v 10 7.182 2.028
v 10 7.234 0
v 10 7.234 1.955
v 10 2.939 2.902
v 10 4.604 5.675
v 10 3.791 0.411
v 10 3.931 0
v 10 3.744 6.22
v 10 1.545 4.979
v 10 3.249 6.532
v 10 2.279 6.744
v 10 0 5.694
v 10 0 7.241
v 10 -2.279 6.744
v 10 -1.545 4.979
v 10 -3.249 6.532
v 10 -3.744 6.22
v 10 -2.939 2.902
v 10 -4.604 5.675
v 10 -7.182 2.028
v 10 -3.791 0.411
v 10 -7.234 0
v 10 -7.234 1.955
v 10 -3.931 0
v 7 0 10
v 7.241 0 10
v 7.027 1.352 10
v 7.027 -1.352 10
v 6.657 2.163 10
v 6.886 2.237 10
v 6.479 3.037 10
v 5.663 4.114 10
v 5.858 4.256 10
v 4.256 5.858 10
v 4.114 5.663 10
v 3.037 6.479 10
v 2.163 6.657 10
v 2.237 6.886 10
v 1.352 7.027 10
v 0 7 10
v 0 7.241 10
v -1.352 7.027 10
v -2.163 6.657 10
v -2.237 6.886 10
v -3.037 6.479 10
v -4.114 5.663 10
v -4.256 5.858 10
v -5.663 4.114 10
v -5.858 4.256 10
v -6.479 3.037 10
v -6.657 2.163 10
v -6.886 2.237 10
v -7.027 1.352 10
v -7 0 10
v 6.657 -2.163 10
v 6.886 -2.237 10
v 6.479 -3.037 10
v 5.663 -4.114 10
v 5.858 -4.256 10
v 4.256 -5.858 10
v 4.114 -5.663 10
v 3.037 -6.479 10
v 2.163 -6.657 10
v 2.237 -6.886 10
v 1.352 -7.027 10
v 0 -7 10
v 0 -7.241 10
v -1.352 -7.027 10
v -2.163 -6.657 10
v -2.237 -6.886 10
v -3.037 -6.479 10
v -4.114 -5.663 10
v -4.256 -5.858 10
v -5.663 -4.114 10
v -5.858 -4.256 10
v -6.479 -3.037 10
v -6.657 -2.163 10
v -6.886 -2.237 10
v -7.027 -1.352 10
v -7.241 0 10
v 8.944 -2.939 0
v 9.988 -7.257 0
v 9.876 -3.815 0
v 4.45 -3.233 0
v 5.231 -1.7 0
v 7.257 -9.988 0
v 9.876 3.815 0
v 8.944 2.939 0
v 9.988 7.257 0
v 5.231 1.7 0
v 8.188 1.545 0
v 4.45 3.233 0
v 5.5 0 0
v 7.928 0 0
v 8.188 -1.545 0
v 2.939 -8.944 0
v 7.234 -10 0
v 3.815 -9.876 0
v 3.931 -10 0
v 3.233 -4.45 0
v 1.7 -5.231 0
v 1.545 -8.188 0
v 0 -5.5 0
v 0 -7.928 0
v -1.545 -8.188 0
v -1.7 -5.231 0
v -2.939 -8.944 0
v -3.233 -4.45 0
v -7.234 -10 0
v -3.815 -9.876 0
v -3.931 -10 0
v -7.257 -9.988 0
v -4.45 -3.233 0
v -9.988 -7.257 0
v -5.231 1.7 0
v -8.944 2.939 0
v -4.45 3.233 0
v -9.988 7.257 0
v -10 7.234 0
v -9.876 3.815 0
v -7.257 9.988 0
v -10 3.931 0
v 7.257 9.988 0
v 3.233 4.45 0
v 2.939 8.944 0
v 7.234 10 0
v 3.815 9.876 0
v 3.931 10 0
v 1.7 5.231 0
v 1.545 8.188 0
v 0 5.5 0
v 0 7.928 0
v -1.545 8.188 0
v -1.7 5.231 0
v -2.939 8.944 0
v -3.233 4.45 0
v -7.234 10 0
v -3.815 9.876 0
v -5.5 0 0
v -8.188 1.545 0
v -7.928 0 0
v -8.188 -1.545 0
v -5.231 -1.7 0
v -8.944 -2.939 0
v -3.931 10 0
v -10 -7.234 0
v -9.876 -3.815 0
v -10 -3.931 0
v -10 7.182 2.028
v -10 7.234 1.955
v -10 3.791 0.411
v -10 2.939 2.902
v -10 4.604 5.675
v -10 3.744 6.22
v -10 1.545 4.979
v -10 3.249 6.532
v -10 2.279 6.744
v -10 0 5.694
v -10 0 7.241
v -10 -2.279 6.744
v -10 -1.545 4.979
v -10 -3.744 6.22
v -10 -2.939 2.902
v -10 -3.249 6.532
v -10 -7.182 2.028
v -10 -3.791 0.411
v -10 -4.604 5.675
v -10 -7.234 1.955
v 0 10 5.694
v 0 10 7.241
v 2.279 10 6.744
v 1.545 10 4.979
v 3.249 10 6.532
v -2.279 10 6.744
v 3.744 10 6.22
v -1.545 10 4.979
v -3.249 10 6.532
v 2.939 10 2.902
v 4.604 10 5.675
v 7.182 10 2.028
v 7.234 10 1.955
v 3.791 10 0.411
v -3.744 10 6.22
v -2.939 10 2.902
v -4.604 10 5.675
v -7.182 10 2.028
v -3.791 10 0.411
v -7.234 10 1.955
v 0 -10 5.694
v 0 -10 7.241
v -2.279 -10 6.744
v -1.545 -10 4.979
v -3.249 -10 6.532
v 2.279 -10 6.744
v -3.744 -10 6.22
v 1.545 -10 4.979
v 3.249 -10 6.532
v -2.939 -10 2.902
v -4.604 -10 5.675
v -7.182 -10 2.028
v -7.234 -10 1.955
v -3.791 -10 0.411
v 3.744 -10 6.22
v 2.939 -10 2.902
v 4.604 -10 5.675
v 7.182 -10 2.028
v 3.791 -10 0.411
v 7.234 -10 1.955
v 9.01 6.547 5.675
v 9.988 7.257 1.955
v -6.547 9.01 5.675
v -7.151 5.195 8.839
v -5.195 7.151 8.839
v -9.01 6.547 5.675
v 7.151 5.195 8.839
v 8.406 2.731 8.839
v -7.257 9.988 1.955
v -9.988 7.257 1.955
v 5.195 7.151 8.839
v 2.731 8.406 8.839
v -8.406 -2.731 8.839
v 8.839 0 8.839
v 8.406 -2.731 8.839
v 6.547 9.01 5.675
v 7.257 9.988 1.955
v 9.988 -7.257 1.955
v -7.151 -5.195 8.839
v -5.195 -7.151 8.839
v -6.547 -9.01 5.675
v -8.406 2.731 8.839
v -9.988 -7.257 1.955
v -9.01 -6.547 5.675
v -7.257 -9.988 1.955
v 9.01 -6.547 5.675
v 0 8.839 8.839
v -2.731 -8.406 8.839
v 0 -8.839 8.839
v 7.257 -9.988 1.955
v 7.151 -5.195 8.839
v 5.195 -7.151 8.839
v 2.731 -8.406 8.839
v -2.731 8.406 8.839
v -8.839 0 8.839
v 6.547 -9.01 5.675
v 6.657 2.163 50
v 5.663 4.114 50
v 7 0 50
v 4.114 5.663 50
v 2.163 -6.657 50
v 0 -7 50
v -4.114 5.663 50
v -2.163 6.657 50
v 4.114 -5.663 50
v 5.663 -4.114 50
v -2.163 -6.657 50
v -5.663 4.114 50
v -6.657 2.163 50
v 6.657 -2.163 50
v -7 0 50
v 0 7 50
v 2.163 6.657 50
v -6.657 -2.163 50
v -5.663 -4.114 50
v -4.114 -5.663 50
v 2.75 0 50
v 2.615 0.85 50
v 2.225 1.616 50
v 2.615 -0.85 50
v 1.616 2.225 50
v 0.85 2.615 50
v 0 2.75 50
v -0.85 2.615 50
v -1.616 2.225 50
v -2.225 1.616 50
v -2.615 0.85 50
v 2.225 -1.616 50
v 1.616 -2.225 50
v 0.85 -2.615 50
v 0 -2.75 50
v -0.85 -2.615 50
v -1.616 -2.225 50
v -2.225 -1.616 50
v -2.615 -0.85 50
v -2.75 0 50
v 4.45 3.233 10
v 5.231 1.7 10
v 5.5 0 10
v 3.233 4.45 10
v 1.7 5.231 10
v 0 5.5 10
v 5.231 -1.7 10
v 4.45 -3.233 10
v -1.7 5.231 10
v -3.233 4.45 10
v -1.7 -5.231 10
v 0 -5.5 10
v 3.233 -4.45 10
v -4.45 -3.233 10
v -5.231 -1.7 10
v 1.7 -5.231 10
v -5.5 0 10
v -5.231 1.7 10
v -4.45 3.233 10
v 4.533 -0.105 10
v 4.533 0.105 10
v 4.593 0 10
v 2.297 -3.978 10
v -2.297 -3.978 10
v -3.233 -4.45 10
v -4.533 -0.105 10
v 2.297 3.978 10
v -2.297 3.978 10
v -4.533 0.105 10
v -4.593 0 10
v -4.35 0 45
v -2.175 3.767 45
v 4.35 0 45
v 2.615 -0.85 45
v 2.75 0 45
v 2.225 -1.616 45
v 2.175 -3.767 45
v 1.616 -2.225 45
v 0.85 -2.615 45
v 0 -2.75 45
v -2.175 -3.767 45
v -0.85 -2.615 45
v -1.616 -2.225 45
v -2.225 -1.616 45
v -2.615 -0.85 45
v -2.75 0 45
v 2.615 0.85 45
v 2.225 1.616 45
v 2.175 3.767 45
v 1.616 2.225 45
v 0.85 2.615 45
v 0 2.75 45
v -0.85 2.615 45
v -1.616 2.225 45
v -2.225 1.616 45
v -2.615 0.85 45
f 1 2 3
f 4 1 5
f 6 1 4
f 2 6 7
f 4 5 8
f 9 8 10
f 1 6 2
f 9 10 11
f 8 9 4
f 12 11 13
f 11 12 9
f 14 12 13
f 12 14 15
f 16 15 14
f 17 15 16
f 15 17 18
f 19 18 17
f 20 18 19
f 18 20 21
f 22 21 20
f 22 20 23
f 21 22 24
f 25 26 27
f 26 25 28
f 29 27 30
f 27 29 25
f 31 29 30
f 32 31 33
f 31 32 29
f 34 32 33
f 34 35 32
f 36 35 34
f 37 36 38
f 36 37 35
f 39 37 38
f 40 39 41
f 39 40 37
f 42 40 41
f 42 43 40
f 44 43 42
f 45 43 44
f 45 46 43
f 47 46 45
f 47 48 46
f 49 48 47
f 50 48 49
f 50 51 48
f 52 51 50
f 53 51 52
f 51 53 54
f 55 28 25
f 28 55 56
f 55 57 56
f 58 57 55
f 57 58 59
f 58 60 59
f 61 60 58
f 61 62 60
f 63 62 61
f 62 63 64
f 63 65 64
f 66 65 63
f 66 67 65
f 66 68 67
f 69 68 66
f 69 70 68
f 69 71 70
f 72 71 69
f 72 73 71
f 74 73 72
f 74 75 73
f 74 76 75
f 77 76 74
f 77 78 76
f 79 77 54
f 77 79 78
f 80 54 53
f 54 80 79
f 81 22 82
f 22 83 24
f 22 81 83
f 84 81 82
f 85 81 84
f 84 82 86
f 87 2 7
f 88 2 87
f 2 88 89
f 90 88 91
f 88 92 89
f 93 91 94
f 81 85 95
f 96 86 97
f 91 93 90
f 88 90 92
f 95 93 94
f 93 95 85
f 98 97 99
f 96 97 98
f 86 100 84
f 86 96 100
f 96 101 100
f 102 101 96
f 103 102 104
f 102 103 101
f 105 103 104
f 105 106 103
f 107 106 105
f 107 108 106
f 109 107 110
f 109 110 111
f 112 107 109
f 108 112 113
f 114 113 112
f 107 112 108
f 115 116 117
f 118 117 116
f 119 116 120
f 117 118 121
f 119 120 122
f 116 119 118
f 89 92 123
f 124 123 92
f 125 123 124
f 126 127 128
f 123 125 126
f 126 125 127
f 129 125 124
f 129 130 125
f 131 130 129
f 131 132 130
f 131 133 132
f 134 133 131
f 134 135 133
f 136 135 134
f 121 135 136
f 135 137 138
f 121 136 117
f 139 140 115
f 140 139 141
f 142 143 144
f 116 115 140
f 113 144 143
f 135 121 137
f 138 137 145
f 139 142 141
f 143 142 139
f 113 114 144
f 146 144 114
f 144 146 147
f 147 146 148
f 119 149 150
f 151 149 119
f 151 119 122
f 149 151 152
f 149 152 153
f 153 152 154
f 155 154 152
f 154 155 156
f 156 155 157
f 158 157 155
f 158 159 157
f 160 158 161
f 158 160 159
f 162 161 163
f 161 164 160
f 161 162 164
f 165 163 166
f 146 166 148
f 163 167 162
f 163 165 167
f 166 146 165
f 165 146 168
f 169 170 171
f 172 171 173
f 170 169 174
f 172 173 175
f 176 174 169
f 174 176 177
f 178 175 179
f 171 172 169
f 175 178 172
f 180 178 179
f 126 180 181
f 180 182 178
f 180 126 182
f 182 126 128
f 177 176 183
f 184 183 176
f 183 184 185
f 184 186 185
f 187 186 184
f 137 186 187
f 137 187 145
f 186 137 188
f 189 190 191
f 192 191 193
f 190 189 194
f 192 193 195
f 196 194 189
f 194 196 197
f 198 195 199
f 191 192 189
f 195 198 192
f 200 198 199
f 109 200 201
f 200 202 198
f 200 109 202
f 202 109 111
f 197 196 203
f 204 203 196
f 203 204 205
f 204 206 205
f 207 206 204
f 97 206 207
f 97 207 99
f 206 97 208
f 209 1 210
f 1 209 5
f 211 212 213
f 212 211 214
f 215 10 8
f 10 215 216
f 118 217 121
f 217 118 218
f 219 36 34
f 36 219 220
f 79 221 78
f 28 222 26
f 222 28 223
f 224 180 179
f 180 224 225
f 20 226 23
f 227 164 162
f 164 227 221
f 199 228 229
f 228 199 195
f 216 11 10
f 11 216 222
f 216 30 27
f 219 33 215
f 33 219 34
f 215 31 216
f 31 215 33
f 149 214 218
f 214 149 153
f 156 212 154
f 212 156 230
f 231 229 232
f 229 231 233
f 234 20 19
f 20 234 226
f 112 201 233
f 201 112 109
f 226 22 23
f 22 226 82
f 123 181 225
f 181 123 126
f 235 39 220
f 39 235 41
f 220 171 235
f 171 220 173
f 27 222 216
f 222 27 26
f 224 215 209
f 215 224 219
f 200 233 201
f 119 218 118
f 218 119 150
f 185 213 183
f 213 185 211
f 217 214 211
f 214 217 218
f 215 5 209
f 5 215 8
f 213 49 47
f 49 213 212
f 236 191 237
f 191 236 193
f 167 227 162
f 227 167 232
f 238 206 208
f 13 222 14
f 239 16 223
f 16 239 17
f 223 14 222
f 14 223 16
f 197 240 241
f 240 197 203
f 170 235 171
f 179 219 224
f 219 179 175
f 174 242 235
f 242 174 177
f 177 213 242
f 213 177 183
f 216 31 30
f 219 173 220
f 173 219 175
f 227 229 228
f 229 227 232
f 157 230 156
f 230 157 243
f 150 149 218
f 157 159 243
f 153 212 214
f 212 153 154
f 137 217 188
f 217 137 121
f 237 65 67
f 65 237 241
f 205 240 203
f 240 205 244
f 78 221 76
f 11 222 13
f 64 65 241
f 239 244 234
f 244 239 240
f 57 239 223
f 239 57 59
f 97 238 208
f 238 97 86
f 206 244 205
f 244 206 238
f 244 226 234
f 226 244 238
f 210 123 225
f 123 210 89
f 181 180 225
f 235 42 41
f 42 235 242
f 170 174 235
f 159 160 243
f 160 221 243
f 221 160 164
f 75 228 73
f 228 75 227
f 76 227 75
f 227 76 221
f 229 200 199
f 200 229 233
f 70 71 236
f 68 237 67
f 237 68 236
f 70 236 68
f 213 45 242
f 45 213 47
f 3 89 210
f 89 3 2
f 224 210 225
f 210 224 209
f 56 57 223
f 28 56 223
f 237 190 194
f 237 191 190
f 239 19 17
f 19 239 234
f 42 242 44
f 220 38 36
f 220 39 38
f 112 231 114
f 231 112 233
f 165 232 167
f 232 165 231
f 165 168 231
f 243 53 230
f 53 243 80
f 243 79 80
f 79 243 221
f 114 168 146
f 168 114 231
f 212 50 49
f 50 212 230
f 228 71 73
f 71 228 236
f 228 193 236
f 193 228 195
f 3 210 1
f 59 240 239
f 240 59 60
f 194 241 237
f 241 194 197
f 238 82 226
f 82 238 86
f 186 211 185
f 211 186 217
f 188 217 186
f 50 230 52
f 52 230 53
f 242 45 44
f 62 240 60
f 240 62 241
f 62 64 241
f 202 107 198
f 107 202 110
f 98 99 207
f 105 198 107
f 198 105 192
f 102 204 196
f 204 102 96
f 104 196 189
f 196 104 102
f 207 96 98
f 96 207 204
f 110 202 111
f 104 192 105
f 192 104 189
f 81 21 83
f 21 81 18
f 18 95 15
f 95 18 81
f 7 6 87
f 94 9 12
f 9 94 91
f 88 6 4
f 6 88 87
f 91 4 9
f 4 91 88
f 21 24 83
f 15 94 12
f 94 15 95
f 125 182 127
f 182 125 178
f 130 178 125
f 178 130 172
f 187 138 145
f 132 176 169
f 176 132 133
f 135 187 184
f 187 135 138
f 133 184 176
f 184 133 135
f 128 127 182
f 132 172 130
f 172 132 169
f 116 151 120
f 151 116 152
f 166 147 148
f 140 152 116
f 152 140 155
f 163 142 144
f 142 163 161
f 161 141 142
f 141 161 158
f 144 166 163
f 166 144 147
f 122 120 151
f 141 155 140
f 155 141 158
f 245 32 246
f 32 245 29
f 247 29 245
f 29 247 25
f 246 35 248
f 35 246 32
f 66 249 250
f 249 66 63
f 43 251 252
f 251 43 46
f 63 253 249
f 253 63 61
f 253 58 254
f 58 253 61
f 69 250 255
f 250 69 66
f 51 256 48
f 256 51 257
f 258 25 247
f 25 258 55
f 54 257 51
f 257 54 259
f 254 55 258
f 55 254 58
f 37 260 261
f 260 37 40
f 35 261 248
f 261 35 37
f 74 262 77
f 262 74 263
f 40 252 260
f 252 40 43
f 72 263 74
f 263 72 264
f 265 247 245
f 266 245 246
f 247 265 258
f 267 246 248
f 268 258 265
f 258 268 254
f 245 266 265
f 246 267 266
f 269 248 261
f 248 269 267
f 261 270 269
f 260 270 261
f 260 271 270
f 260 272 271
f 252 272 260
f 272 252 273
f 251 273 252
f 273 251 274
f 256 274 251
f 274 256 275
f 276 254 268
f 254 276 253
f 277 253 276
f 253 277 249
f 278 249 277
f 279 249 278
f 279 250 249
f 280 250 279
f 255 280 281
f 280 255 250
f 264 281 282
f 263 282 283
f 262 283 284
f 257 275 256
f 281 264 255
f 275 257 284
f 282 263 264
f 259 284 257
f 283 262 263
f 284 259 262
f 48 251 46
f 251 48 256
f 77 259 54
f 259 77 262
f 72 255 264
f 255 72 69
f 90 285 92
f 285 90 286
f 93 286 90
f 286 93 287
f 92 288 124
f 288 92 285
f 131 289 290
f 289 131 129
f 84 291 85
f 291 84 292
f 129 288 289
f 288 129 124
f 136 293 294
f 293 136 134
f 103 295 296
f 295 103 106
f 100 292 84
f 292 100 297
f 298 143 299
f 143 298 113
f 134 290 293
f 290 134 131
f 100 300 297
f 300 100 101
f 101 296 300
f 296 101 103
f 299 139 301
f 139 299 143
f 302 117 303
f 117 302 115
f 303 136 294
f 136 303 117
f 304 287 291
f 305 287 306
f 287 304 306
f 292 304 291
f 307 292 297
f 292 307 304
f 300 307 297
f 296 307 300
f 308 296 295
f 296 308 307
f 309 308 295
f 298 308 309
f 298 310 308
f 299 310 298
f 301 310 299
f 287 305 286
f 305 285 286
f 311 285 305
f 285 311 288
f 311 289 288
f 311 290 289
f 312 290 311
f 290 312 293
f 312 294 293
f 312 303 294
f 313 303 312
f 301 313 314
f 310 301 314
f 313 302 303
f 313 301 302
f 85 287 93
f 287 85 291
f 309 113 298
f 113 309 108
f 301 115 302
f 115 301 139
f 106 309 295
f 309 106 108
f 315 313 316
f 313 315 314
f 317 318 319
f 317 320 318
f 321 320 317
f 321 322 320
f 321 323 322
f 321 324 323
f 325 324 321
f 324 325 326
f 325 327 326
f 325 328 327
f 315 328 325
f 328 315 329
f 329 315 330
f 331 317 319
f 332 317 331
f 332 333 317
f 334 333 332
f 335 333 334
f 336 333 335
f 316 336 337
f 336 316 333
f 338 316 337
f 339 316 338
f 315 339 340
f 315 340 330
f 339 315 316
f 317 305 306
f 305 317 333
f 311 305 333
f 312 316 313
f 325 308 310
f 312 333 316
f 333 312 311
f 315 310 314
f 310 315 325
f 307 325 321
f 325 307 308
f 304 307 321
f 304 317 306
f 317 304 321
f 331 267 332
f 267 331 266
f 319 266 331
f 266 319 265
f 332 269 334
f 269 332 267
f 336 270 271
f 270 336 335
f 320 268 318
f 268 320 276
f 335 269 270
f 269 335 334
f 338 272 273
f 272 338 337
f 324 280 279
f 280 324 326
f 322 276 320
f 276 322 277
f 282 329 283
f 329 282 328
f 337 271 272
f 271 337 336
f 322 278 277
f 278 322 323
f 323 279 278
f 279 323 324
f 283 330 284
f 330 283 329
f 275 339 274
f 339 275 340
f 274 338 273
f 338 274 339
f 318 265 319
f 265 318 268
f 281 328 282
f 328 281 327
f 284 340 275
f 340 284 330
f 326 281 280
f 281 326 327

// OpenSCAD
/*
 * Created by:
 * Thomas Buck <xythobuz@xythobuz.de> in June 2016
 *
 * Licensed under the
 * Creative Commons - Attribution - Share Alike license.
 */

// -----------------------------------------------------------

d_min = 8.7;
d_max = 9.2;
d_inner = 5.5;
d_outer = 14;
d_grip = 11;
w_grip = 20;
h_top = 5;
h_mid = 35;
h_bottom = 10;
sphere_ratio = 1.25;
grip_ratio = 1.75;
grip_angle = 20;

$fn = 20;

// -----------------------------------------------------------

difference() {
    union() {
        difference() {
            intersection() {
                translate([-w_grip / 2, -w_grip / 2, 0])
                    cube([w_grip, w_grip, h_bottom]);
                sphere(d = w_grip * sphere_ratio);
            }
            
            for(angle = [0, 90, 180, 270]) {
                rotate([0, 0, angle])
                    translate([0, -w_grip / grip_ratio, -w_grip / 4])
                    rotate([grip_angle, 0, 0])
                    cylinder(d = h_bottom, h = h_bottom + (w_grip / 2));
            }
        }
        
        translate([0, 0, h_bottom])
            cylinder(d = d_outer, h = h_mid + h_top);
    }
    
    translate([0, 0, -1])
        cylinder(d = d_grip, h = h_bottom + 1);
    
    translate([0, 0, h_bottom - 1])
        cylinder(d1 = d_max, d2 = d_min, h = h_mid + 1, $fn = 6);
    
    translate([0, 0, h_bottom + h_mid - 1])
        cylinder(d = d_inner, h = h_top + 2);
}
